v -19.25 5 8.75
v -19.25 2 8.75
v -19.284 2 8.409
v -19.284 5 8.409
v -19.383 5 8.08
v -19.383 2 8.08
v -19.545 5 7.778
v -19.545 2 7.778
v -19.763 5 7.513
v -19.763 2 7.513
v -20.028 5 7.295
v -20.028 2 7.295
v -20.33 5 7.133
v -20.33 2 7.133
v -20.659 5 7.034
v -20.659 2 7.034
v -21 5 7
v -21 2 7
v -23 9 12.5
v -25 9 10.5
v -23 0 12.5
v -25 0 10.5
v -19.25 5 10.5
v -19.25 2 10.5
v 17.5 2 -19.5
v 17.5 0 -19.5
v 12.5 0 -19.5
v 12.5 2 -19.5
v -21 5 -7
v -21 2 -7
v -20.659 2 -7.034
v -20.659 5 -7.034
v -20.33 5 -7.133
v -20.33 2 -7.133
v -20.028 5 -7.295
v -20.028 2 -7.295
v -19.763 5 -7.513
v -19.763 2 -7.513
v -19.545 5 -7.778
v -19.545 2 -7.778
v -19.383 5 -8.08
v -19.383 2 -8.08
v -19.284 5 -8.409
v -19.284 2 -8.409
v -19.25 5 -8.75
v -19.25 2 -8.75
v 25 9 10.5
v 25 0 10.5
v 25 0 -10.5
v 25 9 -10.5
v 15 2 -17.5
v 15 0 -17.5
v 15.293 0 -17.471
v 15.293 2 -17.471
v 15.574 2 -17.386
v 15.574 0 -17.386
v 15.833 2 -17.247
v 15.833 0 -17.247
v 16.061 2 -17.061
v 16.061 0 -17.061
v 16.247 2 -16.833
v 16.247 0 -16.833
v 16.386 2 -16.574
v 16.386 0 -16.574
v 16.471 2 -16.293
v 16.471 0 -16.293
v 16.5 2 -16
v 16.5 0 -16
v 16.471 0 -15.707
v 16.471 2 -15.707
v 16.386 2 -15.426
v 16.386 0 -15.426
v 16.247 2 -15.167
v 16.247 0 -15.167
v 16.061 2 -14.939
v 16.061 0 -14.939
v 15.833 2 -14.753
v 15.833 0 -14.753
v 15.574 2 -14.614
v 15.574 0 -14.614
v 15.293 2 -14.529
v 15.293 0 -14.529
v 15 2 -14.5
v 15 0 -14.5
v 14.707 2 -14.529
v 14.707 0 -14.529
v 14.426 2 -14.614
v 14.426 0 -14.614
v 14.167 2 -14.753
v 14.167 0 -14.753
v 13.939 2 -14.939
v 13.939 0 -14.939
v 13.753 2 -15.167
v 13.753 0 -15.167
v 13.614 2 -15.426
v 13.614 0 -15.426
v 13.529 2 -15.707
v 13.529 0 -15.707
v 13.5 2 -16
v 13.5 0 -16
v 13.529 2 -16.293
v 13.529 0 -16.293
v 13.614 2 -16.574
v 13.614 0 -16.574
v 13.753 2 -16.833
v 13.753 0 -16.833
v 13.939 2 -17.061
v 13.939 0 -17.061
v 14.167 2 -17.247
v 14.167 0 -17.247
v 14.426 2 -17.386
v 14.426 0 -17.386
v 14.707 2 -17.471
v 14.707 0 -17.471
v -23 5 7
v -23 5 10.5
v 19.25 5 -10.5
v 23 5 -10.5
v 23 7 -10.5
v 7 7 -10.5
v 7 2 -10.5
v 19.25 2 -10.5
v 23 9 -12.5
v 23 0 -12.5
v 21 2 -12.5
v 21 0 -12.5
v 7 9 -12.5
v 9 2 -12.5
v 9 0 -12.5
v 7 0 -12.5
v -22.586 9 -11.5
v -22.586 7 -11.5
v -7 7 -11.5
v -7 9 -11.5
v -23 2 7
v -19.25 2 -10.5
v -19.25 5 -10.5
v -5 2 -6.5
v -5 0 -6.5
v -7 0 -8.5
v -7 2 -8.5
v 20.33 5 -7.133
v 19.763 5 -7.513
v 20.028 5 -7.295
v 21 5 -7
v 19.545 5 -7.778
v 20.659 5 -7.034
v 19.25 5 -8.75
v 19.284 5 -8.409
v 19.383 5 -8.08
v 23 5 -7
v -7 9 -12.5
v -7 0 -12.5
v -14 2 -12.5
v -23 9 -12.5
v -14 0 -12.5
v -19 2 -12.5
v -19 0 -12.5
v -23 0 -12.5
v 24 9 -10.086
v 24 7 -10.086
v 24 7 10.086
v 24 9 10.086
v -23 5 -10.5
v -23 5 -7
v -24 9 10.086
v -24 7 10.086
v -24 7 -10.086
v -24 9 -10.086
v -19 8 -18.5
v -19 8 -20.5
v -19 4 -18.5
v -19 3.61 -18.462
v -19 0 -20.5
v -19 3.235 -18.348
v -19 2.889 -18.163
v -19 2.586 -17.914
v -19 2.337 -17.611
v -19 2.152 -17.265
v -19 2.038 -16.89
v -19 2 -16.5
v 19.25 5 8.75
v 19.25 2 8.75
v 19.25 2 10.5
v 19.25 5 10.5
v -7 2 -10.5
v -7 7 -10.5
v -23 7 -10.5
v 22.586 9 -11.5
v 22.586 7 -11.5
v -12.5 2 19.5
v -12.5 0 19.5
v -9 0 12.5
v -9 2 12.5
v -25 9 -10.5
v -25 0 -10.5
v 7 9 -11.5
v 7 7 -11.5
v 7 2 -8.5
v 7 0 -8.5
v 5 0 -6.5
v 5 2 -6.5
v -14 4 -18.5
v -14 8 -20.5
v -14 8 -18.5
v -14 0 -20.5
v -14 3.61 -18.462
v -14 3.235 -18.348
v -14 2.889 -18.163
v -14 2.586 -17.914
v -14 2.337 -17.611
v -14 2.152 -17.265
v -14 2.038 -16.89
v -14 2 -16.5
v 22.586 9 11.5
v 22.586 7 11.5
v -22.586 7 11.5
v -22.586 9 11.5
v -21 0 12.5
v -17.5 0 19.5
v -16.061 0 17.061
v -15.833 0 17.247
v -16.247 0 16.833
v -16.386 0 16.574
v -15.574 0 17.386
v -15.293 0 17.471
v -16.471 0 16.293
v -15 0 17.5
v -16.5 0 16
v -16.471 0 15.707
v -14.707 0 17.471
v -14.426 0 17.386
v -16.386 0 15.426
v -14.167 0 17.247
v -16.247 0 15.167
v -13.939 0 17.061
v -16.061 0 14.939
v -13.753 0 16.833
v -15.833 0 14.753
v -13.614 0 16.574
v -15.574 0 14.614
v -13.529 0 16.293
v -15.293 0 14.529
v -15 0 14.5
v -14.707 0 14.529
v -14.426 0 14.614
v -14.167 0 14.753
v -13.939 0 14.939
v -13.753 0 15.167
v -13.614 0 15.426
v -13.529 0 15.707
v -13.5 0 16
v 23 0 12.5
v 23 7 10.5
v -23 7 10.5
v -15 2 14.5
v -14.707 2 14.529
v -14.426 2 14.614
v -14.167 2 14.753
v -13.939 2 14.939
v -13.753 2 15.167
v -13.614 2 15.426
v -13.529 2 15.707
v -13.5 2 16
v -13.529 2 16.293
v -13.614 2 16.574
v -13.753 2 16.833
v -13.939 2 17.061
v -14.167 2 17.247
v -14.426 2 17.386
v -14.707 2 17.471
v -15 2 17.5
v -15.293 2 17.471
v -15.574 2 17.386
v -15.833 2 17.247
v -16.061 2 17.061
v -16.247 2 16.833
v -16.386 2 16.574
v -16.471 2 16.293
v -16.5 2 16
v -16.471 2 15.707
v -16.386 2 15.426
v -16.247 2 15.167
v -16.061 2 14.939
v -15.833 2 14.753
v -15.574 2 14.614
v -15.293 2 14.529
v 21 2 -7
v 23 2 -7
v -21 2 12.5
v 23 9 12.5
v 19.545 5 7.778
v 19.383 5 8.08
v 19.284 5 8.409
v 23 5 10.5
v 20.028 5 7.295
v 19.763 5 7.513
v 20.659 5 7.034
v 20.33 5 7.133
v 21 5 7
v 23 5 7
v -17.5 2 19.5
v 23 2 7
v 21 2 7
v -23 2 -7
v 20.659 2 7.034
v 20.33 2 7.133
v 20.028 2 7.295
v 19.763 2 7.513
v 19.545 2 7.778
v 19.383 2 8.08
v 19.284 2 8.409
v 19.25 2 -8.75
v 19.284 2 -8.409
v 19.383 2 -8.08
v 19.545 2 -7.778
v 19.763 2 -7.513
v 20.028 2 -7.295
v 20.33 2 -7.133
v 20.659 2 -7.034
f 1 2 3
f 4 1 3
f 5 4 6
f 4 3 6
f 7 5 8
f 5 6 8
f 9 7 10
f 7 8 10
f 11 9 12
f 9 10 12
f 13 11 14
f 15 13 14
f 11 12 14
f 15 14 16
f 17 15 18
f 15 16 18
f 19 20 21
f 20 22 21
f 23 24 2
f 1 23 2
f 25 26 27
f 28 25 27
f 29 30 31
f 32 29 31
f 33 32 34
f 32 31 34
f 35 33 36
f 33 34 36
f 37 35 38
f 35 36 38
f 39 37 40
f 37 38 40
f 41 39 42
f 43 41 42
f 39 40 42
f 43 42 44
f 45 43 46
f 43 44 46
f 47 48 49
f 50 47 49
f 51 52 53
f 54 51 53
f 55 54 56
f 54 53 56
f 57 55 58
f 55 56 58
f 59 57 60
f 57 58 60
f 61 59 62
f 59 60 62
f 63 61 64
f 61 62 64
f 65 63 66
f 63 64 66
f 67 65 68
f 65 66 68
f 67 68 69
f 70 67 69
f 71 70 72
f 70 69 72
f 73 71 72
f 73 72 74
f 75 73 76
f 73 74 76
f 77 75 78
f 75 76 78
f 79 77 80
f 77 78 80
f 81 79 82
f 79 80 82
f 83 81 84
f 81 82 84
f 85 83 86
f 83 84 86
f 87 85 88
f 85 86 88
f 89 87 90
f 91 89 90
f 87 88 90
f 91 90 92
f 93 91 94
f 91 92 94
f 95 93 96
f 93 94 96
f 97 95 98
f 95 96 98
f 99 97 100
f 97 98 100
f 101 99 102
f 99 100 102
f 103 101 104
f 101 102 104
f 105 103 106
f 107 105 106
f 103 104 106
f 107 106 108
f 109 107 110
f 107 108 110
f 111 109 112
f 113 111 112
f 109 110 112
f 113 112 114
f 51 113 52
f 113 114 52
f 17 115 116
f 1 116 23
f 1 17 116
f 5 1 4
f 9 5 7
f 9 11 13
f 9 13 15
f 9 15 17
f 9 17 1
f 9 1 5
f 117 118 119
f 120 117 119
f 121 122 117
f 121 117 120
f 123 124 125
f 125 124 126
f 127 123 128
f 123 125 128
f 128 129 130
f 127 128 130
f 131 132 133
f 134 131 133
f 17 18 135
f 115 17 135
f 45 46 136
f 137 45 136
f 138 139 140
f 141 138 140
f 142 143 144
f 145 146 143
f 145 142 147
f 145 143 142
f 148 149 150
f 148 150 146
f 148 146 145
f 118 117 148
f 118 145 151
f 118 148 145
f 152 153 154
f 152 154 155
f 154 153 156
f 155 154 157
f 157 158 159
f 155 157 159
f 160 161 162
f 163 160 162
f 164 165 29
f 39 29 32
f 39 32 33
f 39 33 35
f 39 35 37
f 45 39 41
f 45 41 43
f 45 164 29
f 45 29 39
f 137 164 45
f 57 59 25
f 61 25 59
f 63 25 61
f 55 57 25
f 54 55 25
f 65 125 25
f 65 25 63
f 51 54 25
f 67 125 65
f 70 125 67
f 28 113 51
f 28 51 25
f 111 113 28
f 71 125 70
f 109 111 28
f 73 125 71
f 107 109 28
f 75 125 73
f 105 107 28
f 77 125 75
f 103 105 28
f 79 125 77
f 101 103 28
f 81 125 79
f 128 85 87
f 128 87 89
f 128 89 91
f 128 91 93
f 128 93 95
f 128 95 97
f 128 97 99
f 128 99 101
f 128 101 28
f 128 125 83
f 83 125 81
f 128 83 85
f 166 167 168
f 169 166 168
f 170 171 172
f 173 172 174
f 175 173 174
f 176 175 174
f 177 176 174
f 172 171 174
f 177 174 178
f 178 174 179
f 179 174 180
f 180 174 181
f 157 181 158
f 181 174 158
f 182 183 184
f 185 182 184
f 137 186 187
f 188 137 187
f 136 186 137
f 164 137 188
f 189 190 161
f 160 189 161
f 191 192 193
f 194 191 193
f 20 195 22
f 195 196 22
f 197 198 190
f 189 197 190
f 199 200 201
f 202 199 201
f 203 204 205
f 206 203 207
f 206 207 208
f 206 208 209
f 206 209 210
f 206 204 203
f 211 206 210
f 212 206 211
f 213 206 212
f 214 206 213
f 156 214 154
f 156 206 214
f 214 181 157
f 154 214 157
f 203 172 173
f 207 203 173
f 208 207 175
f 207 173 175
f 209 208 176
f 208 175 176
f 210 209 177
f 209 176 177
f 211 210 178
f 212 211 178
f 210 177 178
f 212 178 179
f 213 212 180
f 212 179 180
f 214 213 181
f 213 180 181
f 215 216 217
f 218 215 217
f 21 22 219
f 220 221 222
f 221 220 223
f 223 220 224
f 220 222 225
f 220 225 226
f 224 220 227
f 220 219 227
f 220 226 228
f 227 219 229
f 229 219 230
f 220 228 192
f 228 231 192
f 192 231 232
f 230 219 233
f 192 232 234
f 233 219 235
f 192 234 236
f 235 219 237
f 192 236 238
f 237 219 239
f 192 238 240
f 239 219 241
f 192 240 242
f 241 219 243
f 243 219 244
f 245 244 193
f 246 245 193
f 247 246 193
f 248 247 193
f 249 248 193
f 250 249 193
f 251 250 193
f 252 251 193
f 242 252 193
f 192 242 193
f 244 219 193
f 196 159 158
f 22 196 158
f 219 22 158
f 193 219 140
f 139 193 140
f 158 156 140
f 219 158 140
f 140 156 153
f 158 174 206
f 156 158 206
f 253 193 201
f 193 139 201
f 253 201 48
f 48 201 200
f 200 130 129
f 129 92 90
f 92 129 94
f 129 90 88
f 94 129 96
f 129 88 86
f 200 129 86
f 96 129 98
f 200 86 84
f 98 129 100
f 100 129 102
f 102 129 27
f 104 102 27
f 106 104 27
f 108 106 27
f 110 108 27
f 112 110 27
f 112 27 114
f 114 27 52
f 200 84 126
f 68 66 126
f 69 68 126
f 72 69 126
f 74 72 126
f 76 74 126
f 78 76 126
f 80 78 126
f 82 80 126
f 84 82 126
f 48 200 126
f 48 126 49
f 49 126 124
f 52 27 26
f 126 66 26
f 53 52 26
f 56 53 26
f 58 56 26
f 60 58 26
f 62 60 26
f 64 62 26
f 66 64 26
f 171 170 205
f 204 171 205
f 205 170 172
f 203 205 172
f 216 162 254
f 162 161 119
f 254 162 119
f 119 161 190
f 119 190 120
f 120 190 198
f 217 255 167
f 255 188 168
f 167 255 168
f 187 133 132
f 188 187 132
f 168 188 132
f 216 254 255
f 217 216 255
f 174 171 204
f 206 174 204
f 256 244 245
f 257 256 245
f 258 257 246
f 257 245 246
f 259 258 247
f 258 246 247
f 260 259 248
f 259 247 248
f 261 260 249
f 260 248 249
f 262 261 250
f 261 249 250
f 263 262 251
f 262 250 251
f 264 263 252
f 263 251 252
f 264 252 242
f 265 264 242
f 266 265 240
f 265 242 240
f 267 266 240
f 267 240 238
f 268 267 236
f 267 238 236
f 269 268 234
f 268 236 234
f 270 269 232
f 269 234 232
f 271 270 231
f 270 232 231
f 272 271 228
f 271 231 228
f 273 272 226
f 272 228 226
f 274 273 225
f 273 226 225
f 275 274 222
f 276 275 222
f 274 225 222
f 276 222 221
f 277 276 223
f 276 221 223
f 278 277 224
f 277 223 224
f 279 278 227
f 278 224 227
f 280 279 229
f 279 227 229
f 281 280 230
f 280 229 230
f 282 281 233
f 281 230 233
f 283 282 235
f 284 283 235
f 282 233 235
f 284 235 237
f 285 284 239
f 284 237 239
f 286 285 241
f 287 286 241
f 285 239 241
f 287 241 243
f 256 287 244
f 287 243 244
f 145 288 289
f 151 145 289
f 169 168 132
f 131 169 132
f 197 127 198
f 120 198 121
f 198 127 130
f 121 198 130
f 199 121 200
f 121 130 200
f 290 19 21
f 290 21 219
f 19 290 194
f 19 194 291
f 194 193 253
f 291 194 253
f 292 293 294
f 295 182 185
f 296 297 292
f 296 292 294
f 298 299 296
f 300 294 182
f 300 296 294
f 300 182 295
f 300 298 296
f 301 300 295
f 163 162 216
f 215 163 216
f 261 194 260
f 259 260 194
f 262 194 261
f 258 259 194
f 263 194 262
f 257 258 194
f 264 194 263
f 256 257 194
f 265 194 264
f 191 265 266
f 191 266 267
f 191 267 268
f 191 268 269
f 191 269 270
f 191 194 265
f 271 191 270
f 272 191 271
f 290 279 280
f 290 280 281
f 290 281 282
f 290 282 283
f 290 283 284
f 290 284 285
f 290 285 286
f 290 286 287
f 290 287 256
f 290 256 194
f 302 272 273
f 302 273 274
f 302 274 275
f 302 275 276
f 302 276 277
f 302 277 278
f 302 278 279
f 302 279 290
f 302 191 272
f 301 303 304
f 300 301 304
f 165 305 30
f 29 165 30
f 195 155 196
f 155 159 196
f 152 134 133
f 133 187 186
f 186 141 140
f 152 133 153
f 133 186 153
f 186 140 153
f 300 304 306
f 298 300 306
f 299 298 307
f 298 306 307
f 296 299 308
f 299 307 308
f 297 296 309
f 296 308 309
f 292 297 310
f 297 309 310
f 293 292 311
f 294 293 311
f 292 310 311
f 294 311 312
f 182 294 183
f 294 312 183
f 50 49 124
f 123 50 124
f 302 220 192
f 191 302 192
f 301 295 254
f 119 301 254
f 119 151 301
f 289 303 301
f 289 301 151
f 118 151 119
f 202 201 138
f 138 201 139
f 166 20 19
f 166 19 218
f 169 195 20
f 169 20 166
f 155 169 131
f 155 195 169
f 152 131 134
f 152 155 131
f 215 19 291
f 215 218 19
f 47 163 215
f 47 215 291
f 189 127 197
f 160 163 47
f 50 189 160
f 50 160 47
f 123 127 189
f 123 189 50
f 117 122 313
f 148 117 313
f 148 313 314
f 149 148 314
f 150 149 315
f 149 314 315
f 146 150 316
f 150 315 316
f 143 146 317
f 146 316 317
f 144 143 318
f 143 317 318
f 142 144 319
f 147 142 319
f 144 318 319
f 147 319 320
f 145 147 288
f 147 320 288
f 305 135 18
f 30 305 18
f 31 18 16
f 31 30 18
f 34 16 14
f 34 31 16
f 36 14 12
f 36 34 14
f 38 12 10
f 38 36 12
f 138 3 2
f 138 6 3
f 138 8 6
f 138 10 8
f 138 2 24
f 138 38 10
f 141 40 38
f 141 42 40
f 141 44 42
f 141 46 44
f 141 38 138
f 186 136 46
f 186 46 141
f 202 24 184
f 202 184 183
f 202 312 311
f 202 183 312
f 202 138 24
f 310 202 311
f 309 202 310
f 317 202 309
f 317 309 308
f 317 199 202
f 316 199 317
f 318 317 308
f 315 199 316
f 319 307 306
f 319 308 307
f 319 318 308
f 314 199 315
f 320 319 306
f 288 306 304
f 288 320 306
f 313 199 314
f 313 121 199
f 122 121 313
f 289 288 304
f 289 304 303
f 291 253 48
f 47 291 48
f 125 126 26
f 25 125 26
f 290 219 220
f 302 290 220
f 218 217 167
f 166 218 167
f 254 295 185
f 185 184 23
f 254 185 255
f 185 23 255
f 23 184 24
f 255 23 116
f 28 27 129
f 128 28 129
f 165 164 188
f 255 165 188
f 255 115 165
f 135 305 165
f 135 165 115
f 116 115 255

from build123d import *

# Parameters (mm, degrees)
BOSS_EXTRUDE1_DEPTH = 2
PCBLEDGE_DEPTH      = 3
BOSS_EXTRUDE3_DEPTH = 5
SKETCH4_R           = 1.5
FORSCREWS_DEPTH     = 2
GROOVE_DEPTH        = 2
SKETCH6_W           = 5
SKETCH6_H           = 8
BOSS_EXTRUDE6_DEPTH = 8
CUT_EXTRUDE1_DEPTH  = 7


with BuildPart() as part:
    # Sketch1 → Boss-Extrude1 (new body)
    with BuildSketch(Plane(origin=(0, 0, 0), x_dir=(1, 0, 0), z_dir=(0, 1, 0))):
        Polygon((-7, 12.5), (-23, 12.5), (-25, 10.5), (-25, -10.5), (-23, -12.5), (23, -12.5), (25, -10.5), (25, 10.5), (23, 12.5), (7, 12.5), (7, 8.5), (5, 6.5), (-5, 6.5), (-7, 8.5), align=None)
    extrude(amount=BOSS_EXTRUDE1_DEPTH)

    # Sketch2 → PcbLedge (add)
    with BuildSketch(Plane(origin=(0, 2, 0), x_dir=(1, 0, 0), z_dir=(0, 1, 0))):
        with BuildLine():
            Line((23, 10.5), (19.25, 10.5))
            Line((19.25, 10.5), (19.25, 8.75))
            ThreePointArc((19.25, 8.75), (19.762563133, 7.512563133), (21, 7))
            Line((21, 7), (23, 7))
            Line((23, 7), (23, 10.5))
        make_face()
        with BuildLine():
            Line((23, -10.5), (23, -7))
            Line((23, -7), (21, -7))
            ThreePointArc((21, -7), (19.762563133, -7.512563133), (19.25, -8.75))
            Line((19.25, -8.75), (19.25, -10.5))
            Line((19.25, -10.5), (23, -10.5))
        make_face()
        with BuildLine():
            Line((-23, -10.5), (-19.25, -10.5))
            Line((-19.25, -10.5), (-19.25, -8.75))
            ThreePointArc((-19.25, -8.75), (-19.762563133, -7.512563133), (-21, -7))
            Line((-21, -7), (-23, -7))
            Line((-23, -7), (-23, -10.5))
        make_face()
        with BuildLine():
            Line((-19.25, 8.75), (-19.25, 10.5))
            Line((-19.25, 10.5), (-23, 10.5))
            Line((-23, 10.5), (-23, 7))
            Line((-23, 7), (-21, 7))
            ThreePointArc((-21, 7), (-19.762563133, 7.512563133), (-19.25, 8.75))
        make_face()
    extrude(amount=PCBLEDGE_DEPTH)

    # Sketch2<3> → Boss-Extrude3 (add)
    with BuildSketch(Plane(origin=(0, 2, 0), x_dir=(1, 0, 0), z_dir=(0, 1, 0))):
        Polygon((23, 12.5), (7, 12.5), (7, 10.5), (19.25, 10.5), (23, 10.5), (23, 7), (23, -7), (23, -10.5), (19.25, -10.5), (0, -10.5), (-19.25, -10.5), (-23, -10.5), (-23, -7), (-23, 7), (-23, 10.5), (-19.25, 10.5), (-7, 10.5), (-7, 12.5), (-23, 12.5), (-25, 10.5), (-25, -10.5), (-23, -12.5), (0, -12.5), (23, -12.5), (25, -10.5), (25, 10.5), align=None)
    extrude(amount=BOSS_EXTRUDE3_DEPTH)

    # Sketch4 → ForScrews (add)
    # profile 1 of 2: a face of its own
    with BuildSketch(Plane.XZ):
        Polygon((21, -12.5), (17.5, -19.5), (12.5, -19.5), (9, -12.5), align=None)
        with Locations((15, -16)):
            Circle(SKETCH4_R, mode=Mode.SUBTRACT)
    # profile 2 of 2: a face of its own
    with BuildSketch(Plane.XZ):
        Polygon((-12.5, 19.5), (-9, 12.5), (-21, 12.5), (-17.5, 19.5), align=None)
        with Locations((-15, 16)):
            Circle(SKETCH4_R, mode=Mode.SUBTRACT)
    extrude(amount=-FORSCREWS_DEPTH)

    # Sketch5 → Groove (add)
    with BuildSketch(Plane(origin=(0, 7, 0), x_dir=(1, 0, 0), z_dir=(0, 1, 0))):
        Polygon((25, 10.5), (23, 12.5), (7, 12.5), (7, 11.5), (22.585786438, 11.5), (24, 10.085786438), (24, -10.085786438), (22.585786438, -11.5), (-22.585786438, -11.5), (-24, -10.085786438), (-24, 10.085786438), (-22.585786438, 11.5), (-7, 11.5), (-7, 12.5), (-23, 12.5), (-25, 10.5), (-25, -10.5), (-23, -12.5), (23, -12.5), (25, -10.5), align=None)
    extrude(amount=GROOVE_DEPTH)

    # Sketch6 → Boss-Extrude6 (add)
    with BuildSketch(Plane.XZ):
        with Locations((-16.5, -16.5)):
            Rectangle(SKETCH6_W, SKETCH6_H)
    extrude(amount=-BOSS_EXTRUDE6_DEPTH)

    # Sketch7 → Cut-Extrude1 (cut)
    with BuildSketch(Plane.ZY.offset(19)):
        with BuildLine():
            Line((-16.5, 2), (-12.5, 2))
            Line((-12.5, 2), (-12.5, 8.728396631))
            Line((-12.5, 8.728396631), (-18.5, 8.728396631))
            Line((-18.5, 8.728396631), (-18.5, 4))
            ThreePointArc((-18.5, 4), (-17.914213562, 2.585786438), (-16.5, 2))
        make_face()
    extrude(amount=-CUT_EXTRUDE1_DEPTH, mode=Mode.SUBTRACT)


solid = part.part
